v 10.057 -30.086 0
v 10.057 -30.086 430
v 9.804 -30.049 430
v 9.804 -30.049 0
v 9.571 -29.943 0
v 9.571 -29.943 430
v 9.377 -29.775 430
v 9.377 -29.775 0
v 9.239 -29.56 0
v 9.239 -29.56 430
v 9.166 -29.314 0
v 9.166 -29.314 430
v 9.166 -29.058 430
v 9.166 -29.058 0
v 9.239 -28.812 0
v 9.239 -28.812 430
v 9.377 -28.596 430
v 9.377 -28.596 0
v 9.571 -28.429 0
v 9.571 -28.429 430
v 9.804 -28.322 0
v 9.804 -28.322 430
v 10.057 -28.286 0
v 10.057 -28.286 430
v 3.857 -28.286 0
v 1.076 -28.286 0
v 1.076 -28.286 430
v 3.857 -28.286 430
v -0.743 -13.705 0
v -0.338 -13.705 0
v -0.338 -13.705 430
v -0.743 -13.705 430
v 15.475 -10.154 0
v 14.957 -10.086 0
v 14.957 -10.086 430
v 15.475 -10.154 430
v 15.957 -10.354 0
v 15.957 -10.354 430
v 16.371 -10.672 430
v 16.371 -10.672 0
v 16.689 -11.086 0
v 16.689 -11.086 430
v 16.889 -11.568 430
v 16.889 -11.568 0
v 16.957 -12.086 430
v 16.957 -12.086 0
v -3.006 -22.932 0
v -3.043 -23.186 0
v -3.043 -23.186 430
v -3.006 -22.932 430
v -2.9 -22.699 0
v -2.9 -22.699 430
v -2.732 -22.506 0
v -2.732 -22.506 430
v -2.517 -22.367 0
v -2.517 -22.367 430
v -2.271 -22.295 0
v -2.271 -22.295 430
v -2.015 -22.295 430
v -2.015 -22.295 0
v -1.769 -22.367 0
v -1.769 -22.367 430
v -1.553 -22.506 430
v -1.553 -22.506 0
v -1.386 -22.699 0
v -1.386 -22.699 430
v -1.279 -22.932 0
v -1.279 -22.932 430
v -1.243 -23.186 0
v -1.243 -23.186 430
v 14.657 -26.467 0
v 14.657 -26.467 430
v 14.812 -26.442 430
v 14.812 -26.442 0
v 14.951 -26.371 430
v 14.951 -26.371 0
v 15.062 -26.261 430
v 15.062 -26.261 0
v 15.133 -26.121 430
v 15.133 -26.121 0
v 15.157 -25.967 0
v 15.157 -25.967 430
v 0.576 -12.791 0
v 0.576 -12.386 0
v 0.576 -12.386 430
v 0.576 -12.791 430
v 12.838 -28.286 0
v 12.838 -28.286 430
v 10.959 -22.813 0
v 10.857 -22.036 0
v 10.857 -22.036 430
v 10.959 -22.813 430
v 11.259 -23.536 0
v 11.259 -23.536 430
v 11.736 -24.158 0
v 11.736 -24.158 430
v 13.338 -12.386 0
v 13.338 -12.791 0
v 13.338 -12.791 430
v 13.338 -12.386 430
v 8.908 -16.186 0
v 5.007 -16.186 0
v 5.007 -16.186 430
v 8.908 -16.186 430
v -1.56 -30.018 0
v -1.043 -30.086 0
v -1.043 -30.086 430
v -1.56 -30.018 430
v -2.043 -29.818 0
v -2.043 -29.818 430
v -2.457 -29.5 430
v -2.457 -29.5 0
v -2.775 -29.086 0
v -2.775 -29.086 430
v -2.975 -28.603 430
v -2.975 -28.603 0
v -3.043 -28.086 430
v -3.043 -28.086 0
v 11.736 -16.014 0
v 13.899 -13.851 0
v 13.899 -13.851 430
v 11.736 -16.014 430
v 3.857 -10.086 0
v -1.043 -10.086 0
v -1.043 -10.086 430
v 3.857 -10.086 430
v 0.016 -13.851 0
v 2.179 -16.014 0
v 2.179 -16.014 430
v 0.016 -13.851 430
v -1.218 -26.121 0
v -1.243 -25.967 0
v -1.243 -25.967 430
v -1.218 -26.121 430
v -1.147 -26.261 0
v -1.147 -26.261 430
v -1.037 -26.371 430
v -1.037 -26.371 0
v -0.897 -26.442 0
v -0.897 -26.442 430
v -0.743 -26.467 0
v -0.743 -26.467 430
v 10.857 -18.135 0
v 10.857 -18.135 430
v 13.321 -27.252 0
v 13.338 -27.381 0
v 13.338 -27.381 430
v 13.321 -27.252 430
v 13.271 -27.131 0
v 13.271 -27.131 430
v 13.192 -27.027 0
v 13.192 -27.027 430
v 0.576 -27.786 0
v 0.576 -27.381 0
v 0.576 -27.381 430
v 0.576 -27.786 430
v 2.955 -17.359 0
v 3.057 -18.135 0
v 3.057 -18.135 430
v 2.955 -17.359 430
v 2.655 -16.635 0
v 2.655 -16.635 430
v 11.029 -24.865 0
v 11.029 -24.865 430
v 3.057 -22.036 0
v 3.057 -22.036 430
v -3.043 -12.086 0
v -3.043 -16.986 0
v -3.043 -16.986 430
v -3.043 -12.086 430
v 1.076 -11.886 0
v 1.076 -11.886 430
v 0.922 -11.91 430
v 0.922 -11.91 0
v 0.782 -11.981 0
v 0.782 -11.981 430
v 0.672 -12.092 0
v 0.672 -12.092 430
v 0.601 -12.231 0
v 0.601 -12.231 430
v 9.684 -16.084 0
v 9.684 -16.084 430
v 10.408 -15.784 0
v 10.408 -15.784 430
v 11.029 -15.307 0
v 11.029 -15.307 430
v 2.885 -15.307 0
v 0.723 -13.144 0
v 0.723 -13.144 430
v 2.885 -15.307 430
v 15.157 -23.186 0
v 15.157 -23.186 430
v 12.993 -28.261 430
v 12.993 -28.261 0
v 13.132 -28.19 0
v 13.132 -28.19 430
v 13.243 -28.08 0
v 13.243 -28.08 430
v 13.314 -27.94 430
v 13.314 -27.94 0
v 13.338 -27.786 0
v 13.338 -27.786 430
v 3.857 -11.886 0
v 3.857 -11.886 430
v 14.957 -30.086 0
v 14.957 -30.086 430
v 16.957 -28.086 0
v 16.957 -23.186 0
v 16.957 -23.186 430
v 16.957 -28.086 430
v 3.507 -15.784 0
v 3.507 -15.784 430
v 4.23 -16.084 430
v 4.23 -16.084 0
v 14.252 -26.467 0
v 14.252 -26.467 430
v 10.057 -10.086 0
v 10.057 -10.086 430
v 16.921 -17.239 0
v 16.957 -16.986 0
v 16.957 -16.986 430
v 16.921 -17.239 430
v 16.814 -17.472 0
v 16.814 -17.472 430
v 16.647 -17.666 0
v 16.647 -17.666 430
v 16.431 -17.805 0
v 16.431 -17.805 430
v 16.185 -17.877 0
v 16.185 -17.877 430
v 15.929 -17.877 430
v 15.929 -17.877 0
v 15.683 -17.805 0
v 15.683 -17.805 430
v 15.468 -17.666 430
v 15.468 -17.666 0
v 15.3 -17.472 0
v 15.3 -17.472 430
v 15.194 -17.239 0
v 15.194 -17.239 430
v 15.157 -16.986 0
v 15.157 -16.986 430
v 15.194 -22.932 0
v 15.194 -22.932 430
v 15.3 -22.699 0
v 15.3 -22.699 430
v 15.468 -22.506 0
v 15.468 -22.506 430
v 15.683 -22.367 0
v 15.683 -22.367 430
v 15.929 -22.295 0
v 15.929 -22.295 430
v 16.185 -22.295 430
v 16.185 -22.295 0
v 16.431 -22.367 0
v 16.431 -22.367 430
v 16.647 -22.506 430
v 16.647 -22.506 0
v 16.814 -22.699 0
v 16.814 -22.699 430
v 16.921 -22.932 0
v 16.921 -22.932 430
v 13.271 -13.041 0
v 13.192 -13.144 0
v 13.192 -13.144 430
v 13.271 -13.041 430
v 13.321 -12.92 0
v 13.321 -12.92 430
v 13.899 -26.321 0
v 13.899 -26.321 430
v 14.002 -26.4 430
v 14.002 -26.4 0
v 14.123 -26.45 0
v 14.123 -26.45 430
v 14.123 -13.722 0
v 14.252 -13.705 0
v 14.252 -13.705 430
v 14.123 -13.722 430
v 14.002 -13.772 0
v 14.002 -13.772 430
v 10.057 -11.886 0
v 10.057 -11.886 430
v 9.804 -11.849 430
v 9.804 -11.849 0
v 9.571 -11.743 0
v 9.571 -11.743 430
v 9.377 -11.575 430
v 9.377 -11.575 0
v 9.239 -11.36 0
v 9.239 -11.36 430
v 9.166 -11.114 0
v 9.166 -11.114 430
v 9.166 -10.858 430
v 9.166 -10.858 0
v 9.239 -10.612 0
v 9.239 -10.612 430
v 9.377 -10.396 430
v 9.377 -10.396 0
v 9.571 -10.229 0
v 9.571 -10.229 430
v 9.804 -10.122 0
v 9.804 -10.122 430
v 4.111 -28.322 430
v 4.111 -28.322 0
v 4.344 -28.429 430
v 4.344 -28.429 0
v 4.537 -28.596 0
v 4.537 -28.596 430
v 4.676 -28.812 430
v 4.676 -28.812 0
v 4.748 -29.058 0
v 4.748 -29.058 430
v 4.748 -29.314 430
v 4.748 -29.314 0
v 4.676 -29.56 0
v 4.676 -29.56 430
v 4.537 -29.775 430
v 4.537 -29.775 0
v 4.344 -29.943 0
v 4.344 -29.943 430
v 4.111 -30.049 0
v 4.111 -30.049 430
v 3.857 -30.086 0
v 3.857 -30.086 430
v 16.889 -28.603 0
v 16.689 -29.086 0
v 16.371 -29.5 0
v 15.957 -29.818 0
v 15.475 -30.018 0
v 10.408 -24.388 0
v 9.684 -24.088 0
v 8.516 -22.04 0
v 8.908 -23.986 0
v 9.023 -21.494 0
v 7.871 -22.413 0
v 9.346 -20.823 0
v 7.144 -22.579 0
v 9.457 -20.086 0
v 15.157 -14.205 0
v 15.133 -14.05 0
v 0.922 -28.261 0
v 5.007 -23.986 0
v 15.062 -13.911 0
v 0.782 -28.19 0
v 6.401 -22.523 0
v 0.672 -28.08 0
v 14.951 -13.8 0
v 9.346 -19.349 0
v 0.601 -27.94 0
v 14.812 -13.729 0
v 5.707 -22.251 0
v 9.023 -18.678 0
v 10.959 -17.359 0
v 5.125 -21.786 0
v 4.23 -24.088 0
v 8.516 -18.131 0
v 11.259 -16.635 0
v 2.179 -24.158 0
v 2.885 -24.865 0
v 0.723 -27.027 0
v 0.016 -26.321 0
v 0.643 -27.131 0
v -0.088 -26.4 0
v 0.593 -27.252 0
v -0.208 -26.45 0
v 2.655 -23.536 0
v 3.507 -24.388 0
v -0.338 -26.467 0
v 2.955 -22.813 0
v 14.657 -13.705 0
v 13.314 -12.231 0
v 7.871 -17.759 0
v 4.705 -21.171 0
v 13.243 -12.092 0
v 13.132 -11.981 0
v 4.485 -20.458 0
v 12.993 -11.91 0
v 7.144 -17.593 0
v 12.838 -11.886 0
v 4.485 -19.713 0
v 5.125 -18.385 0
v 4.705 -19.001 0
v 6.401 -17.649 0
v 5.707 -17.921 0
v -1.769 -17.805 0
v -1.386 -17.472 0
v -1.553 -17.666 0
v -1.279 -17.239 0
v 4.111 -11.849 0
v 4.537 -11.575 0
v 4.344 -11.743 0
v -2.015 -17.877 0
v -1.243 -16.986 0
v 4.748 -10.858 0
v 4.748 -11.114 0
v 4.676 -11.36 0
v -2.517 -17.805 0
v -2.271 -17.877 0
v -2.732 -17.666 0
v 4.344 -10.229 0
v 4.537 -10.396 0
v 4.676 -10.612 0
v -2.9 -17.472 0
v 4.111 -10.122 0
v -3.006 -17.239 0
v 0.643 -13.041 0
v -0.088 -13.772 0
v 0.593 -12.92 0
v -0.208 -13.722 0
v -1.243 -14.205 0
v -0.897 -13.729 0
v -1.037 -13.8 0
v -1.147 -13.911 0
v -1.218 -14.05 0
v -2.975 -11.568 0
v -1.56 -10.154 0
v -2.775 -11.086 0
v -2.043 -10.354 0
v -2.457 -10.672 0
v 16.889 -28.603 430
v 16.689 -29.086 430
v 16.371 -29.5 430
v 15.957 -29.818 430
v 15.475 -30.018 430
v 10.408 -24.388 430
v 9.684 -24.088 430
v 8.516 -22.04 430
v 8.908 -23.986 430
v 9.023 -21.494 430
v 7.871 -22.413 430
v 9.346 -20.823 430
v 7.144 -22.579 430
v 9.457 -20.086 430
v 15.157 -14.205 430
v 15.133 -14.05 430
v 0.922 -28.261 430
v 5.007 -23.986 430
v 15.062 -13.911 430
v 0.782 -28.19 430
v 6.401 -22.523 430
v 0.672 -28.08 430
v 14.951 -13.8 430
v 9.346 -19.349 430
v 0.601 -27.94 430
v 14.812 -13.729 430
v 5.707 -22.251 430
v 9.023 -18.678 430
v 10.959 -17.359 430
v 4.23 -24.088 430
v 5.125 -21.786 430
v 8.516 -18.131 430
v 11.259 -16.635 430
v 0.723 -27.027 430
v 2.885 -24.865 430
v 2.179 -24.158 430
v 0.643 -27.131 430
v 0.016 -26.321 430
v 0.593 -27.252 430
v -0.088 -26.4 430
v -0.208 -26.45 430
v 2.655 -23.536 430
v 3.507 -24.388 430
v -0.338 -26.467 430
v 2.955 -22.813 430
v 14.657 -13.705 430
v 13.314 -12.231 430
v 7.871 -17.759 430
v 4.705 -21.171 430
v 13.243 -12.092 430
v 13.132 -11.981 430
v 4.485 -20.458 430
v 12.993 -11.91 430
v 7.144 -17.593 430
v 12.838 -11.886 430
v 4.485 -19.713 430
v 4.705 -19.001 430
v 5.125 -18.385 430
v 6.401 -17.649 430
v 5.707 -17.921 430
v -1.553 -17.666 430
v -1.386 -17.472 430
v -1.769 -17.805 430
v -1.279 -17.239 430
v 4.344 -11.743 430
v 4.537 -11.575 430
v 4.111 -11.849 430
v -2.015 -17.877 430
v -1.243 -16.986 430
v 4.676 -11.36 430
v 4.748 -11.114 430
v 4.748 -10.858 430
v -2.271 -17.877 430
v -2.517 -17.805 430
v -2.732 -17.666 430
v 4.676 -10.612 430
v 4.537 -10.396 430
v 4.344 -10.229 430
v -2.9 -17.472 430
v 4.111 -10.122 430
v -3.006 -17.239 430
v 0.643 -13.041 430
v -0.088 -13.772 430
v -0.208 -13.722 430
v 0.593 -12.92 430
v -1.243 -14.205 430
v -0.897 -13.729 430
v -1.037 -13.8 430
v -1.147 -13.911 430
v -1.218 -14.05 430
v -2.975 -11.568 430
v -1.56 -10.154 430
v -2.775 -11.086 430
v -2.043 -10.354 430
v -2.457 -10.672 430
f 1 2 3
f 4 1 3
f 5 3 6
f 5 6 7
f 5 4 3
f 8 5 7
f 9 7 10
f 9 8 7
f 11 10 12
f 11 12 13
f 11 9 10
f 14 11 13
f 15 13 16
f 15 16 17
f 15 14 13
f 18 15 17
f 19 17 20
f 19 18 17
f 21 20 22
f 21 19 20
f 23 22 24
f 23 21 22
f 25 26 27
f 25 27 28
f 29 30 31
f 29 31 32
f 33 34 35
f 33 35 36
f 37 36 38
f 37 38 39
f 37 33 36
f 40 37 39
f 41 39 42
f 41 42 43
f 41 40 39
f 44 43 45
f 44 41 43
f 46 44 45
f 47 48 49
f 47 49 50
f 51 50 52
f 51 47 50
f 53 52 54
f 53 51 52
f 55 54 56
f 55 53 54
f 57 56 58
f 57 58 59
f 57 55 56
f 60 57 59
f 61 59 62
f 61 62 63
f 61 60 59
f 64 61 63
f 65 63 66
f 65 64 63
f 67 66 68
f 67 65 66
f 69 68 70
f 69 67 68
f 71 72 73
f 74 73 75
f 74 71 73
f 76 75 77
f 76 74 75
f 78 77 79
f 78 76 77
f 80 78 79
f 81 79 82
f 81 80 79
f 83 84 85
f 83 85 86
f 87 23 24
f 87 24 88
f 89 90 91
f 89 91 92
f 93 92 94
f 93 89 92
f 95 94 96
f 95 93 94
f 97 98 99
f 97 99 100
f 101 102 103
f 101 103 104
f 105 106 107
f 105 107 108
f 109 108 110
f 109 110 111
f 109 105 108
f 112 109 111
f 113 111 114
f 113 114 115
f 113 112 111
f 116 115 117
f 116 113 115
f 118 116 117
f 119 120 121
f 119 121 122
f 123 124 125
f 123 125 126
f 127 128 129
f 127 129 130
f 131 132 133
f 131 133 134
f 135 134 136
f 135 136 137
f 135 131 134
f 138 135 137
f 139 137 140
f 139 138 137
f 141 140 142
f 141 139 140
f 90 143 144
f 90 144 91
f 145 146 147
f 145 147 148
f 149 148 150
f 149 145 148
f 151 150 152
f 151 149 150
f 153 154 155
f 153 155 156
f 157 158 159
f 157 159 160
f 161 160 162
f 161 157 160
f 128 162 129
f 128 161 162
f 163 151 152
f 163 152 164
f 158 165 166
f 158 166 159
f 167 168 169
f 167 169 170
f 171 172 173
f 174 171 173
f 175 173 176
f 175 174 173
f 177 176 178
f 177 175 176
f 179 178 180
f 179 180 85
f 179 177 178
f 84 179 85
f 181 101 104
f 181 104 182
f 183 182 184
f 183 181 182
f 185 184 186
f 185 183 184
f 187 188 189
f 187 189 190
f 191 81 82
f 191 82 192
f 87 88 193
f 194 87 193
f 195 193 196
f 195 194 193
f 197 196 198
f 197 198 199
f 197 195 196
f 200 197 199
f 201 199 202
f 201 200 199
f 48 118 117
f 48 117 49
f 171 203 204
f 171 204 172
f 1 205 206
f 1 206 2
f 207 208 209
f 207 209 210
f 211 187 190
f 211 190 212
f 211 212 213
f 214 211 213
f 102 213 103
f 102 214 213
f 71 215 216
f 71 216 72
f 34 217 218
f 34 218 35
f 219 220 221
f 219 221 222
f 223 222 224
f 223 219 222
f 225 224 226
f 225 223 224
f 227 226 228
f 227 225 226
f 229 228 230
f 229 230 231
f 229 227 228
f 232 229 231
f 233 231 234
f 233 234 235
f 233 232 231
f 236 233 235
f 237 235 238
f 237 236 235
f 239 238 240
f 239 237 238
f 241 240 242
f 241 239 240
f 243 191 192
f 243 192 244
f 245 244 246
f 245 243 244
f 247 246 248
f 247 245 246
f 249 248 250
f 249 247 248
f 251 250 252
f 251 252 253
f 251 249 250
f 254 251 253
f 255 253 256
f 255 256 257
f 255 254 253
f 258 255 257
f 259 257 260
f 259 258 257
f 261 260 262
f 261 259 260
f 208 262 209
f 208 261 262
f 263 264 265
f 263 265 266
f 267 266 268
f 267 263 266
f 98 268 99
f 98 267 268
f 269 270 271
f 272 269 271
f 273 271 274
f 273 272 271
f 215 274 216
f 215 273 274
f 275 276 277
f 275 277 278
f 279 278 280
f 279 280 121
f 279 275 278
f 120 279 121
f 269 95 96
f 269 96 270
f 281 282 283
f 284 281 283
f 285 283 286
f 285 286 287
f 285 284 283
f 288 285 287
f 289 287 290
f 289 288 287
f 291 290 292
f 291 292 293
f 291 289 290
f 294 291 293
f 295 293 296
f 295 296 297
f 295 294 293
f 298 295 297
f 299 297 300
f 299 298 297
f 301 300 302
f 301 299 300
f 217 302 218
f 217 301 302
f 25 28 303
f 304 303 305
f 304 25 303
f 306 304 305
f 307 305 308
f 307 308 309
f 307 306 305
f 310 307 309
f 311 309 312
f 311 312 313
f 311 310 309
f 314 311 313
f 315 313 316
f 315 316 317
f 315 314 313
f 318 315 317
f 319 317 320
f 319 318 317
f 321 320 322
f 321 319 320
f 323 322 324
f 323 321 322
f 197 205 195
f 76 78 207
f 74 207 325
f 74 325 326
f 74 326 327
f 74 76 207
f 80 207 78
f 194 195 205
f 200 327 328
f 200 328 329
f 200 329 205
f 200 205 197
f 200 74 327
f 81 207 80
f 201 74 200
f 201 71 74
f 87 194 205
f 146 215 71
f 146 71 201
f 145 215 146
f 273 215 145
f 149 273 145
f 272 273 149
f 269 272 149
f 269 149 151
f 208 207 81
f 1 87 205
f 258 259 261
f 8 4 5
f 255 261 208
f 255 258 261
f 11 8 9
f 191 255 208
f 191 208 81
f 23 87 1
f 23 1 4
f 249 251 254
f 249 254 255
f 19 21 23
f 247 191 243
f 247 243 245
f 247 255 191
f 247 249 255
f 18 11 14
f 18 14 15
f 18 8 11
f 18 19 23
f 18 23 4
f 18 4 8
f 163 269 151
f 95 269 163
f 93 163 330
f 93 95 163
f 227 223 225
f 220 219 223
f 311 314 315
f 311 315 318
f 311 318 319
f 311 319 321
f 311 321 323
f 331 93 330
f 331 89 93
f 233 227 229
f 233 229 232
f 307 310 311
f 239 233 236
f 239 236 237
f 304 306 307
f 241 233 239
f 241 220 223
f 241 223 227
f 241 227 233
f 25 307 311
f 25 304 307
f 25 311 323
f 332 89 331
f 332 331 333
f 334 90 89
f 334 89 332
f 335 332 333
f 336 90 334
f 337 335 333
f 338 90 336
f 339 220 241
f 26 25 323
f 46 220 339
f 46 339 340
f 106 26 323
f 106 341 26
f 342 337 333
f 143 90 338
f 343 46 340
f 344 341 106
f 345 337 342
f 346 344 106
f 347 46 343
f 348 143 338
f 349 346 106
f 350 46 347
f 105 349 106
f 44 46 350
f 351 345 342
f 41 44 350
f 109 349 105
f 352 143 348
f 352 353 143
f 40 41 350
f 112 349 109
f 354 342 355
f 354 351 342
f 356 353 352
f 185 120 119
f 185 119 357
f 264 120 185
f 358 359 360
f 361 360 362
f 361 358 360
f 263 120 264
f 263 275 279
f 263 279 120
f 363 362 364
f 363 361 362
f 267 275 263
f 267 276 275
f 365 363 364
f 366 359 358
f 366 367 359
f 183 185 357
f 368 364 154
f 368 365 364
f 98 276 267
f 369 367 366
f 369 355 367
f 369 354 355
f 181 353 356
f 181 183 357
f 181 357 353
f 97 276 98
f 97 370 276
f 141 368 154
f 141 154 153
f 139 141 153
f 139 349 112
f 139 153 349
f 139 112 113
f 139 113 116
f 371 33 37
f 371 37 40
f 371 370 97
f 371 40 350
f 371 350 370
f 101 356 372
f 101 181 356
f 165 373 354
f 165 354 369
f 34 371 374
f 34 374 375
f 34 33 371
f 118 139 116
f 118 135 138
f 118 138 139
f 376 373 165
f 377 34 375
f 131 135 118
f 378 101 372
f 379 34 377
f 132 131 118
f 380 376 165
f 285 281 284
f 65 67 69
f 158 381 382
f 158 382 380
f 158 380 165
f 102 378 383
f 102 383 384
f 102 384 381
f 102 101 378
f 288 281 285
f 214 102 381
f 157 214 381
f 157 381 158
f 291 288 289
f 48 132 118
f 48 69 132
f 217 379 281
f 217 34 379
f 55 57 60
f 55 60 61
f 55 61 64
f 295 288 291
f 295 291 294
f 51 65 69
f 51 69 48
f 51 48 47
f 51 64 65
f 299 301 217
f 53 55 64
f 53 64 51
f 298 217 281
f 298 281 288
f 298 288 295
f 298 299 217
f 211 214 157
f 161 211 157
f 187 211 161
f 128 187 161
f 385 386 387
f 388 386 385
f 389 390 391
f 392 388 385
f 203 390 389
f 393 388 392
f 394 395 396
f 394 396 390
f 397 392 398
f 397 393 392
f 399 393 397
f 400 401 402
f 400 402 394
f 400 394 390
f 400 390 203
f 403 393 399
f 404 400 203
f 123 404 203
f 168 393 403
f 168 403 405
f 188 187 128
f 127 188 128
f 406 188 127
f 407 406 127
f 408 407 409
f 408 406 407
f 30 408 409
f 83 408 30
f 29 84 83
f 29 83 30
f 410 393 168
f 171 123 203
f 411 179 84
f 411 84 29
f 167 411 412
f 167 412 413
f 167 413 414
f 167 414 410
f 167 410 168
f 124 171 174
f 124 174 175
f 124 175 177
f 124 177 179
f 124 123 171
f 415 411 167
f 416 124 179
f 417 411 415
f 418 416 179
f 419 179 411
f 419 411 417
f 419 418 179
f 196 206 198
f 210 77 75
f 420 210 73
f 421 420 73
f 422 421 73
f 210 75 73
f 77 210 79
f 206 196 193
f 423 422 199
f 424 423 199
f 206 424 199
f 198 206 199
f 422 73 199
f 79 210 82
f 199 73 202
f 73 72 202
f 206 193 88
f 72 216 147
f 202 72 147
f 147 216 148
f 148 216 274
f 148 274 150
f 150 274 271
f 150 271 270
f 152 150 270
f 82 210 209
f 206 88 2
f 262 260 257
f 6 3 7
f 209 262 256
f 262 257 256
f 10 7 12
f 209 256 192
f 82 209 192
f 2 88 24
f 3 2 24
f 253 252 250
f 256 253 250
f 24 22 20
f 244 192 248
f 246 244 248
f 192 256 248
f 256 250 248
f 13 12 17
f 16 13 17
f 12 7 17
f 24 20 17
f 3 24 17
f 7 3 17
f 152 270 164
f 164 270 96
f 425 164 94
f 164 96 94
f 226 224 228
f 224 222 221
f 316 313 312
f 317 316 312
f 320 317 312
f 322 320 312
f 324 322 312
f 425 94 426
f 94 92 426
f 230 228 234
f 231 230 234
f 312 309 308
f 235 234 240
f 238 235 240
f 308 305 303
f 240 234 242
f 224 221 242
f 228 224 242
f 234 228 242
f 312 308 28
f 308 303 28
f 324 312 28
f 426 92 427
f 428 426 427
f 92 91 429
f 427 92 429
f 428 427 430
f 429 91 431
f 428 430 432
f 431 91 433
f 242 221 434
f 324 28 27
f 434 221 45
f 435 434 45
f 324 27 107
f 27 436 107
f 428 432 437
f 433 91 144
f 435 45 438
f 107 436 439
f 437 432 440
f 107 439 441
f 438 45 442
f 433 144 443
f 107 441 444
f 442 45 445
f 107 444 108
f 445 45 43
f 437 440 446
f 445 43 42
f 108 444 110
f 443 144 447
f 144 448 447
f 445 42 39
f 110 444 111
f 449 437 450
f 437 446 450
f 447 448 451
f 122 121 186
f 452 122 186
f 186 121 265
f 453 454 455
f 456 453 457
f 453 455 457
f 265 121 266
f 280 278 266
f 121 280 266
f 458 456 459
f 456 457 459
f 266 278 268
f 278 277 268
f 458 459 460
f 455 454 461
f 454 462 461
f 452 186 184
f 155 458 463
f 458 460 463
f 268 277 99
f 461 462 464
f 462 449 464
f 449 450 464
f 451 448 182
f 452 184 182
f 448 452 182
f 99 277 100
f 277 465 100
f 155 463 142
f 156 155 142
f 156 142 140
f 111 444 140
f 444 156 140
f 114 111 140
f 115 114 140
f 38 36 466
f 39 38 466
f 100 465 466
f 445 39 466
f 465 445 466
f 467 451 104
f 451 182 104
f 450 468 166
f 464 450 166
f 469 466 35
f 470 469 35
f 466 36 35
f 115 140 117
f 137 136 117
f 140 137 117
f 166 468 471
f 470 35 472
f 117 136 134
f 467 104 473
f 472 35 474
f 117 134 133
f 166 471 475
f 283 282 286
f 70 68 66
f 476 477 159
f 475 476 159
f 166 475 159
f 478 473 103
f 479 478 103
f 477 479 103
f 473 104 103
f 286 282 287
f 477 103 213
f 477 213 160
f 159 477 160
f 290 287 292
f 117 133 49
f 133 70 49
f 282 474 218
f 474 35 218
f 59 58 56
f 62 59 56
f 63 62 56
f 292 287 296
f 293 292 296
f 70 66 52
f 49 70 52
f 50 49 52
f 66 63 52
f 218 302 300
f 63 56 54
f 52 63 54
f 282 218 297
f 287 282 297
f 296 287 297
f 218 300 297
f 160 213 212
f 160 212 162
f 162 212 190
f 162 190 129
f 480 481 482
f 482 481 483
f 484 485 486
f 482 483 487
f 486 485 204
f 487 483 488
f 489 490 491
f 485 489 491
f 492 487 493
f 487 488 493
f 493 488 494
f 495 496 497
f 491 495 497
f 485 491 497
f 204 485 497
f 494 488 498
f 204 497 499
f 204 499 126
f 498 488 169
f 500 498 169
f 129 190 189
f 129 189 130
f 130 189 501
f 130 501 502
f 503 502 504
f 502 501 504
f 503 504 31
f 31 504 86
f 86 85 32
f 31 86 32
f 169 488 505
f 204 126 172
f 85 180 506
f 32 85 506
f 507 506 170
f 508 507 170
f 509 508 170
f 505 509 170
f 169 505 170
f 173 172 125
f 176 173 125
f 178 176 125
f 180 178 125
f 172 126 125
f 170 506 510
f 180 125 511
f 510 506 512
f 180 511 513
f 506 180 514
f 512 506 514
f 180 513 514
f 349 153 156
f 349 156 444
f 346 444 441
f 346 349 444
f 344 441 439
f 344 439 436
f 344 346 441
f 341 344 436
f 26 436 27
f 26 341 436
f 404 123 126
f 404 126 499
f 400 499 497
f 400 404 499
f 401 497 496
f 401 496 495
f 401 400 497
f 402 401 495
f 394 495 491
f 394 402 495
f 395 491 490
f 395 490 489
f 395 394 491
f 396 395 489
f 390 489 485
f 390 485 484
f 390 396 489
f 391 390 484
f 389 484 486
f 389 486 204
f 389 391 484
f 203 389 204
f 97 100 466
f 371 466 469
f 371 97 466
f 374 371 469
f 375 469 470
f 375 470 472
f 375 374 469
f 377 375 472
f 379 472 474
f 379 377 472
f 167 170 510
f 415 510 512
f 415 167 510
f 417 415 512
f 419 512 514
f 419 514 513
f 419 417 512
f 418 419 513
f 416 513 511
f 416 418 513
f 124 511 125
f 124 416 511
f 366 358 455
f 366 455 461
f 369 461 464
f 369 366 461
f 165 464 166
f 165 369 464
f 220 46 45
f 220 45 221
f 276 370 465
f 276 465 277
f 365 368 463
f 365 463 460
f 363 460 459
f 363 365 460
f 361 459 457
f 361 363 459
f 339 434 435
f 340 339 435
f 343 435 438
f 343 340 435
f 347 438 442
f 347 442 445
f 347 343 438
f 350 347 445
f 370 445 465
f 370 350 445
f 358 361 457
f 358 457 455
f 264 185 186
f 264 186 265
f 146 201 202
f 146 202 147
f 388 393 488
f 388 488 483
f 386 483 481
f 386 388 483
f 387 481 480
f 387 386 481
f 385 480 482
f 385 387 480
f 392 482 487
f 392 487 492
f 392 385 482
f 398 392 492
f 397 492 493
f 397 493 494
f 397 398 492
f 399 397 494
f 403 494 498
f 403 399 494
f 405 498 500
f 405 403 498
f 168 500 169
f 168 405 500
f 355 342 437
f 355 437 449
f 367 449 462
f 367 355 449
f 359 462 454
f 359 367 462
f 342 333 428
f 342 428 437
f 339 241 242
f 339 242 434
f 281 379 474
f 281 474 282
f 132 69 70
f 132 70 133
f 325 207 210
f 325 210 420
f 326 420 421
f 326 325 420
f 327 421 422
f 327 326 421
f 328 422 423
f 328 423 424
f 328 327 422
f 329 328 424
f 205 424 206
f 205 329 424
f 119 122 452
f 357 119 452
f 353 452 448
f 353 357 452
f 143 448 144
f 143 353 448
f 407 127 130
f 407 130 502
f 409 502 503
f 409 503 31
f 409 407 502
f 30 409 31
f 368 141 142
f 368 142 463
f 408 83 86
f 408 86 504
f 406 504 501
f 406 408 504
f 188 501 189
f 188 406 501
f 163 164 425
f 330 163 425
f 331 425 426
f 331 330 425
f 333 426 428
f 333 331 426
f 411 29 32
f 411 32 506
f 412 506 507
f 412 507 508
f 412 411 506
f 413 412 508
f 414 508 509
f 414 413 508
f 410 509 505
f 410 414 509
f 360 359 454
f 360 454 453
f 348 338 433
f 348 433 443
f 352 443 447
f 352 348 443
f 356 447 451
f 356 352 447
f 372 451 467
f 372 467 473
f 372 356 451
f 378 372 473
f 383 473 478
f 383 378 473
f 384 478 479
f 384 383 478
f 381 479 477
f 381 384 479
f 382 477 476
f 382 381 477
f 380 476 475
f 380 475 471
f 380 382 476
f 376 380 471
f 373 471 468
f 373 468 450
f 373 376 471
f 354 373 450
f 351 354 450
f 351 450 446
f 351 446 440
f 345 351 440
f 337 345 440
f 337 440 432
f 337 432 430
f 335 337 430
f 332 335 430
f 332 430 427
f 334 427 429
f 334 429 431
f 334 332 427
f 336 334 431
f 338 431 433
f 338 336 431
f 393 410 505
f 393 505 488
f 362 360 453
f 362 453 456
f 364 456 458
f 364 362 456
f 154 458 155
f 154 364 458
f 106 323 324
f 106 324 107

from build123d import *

# Parameters (mm, degrees)
SKETCH_2_R      = 2.5
EXTRUDE_1_DEPTH = 430


with BuildPart() as part:
    # 草图2 → 凸台-拉伸1 (new body)
    with BuildSketch(Plane.XY):
        with BuildLine():
            Line((-1.042752475, -10.085861632), (3.857247525, -10.085861632))
            ThreePointArc((3.857247525, -10.085861632), (4.757247525, -10.985861632), (3.857247525, -11.885861632))
            Line((3.857247525, -11.885861632), (1.076161722, -11.885861632))
            ThreePointArc((1.076161722, -11.885861632), (0.722608332, -12.032308241), (0.576161722, -12.385861632))
            Line((0.576161722, -12.385861632), (0.576161722, -12.790788968))
            ThreePointArc((0.576161722, -12.790788968), (0.614221956, -12.982130685), (0.722608332, -13.144342359))
            Line((0.722608332, -13.144342359), (2.885447948, -15.307181975))
            ThreePointArc((2.885447948, -15.307181975), (3.858717994, -15.957500229), (5.006768291, -16.185861632))
            Line((5.006768291, -16.185861632), (8.907726758, -16.185861632))
            ThreePointArc((8.907726758, -16.185861632), (10.055777055, -15.957500229), (11.029047102, -15.307181975))
            Line((11.029047102, -15.307181975), (13.191886718, -13.144342359))
            ThreePointArc((13.191886718, -13.144342359), (13.300273094, -12.982130685), (13.338333327, -12.790788968))
            Line((13.338333327, -12.790788968), (13.338333327, -12.385861632))
            ThreePointArc((13.338333327, -12.385861632), (13.191886718, -12.032308241), (12.838333327, -11.885861632))
            Line((12.838333327, -11.885861632), (10.057247525, -11.885861632))
            ThreePointArc((10.057247525, -11.885861632), (9.157247525, -10.985861632), (10.057247525, -10.085861632))
            Line((10.057247525, -10.085861632), (14.957247525, -10.085861632))
            ThreePointArc((14.957247525, -10.085861632), (16.371461087, -10.671648069), (16.957247525, -12.085861632))
            Line((16.957247525, -12.085861632), (16.957247525, -16.985861632))
            ThreePointArc((16.957247525, -16.985861632), (16.057247525, -17.885861632), (15.157247525, -16.985861632))
            Line((15.157247525, -16.985861632), (15.157247525, -14.204775829))
            ThreePointArc((15.157247525, -14.204775829), (15.010800915, -13.851222438), (14.657247525, -13.704775829))
            Line((14.657247525, -13.704775829), (14.252320188, -13.704775829))
            ThreePointArc((14.252320188, -13.704775829), (14.060978472, -13.742836063), (13.898766797, -13.851222438))
            Line((13.898766797, -13.851222438), (11.735927181, -16.014062054))
            ThreePointArc((11.735927181, -16.014062054), (11.085608927, -16.987332101), (10.857247525, -18.135382398))
            Line((10.857247525, -18.135382398), (10.857247525, -22.036340865))
            ThreePointArc((10.857247525, -22.036340865), (11.085608927, -23.184391162), (11.735927181, -24.157661209))
            Line((11.735927181, -24.157661209), (13.898766797, -26.320500825))
            ThreePointArc((13.898766797, -26.320500825), (14.060978472, -26.4288872), (14.252320188, -26.466947434))
            Line((14.252320188, -26.466947434), (14.657247525, -26.466947434))
            ThreePointArc((14.657247525, -26.466947434), (15.010800915, -26.320500825), (15.157247525, -25.966947434))
            Line((15.157247525, -25.966947434), (15.157247525, -23.185861632))
            ThreePointArc((15.157247525, -23.185861632), (16.057247525, -22.285861632), (16.957247525, -23.185861632))
            Line((16.957247525, -23.185861632), (16.957247525, -28.085861632))
            ThreePointArc((16.957247525, -28.085861632), (16.371461087, -29.500075194), (14.957247525, -30.085861632))
            Line((14.957247525, -30.085861632), (10.057247525, -30.085861632))
            ThreePointArc((10.057247525, -30.085861632), (9.157247525, -29.185861632), (10.057247525, -28.285861632))
            Line((10.057247525, -28.285861632), (12.838333327, -28.285861632))
            ThreePointArc((12.838333327, -28.285861632), (13.191886718, -28.139415022), (13.338333327, -27.785861632))
            Line((13.338333327, -27.785861632), (13.338333327, -27.380934295))
            ThreePointArc((13.338333327, -27.380934295), (13.300273094, -27.189592579), (13.191886718, -27.027380904))
            Line((13.191886718, -27.027380904), (11.029047102, -24.864541288))
            ThreePointArc((11.029047102, -24.864541288), (10.055777055, -24.214223034), (8.907726758, -23.985861632))
            Line((8.907726758, -23.985861632), (5.006768291, -23.985861632))
            ThreePointArc((5.006768291, -23.985861632), (3.858717994, -24.214223034), (2.885447948, -24.864541288))
            Line((2.885447948, -24.864541288), (0.722608332, -27.027380904))
            ThreePointArc((0.722608332, -27.027380904), (0.614221956, -27.189592579), (0.576161722, -27.380934295))
            Line((0.576161722, -27.380934295), (0.576161722, -27.785861632))
            ThreePointArc((0.576161722, -27.785861632), (0.722608332, -28.139415022), (1.076161722, -28.285861632))
            Line((1.076161722, -28.285861632), (3.857247525, -28.285861632))
            ThreePointArc((3.857247525, -28.285861632), (4.757247525, -29.185861632), (3.857247525, -30.085861632))
            Line((3.857247525, -30.085861632), (-1.042752475, -30.085861632))
            ThreePointArc((-1.042752475, -30.085861632), (-2.456966038, -29.500075194), (-3.042752475, -28.085861632))
            Line((-3.042752475, -28.085861632), (-3.042752475, -23.185861632))
            ThreePointArc((-3.042752475, -23.185861632), (-2.142752475, -22.285861632), (-1.242752475, -23.185861632))
            Line((-1.242752475, -23.185861632), (-1.242752475, -25.966947434))
            ThreePointArc((-1.242752475, -25.966947434), (-1.096305866, -26.320500825), (-0.742752475, -26.466947434))
            Line((-0.742752475, -26.466947434), (-0.337825138, -26.466947434))
            ThreePointArc((-0.337825138, -26.466947434), (-0.146483422, -26.4288872), (0.015728252, -26.320500825))
            Line((0.015728252, -26.320500825), (2.178567868, -24.157661209))
            ThreePointArc((2.178567868, -24.157661209), (2.828886122, -23.184391162), (3.057247525, -22.036340865))
            Line((3.057247525, -22.036340865), (3.057247525, -18.135382398))
            ThreePointArc((3.057247525, -18.135382398), (2.828886122, -16.987332101), (2.178567868, -16.014062054))
            Line((2.178567868, -16.014062054), (0.015728252, -13.851222438))
            ThreePointArc((0.015728252, -13.851222438), (-0.146483422, -13.742836063), (-0.337825138, -13.704775829))
            Line((-0.337825138, -13.704775829), (-0.742752475, -13.704775829))
            ThreePointArc((-0.742752475, -13.704775829), (-1.096305866, -13.851222438), (-1.242752475, -14.204775829))
            Line((-1.242752475, -14.204775829), (-1.242752475, -16.985861632))
            ThreePointArc((-1.242752475, -16.985861632), (-2.142752475, -17.885861632), (-3.042752475, -16.985861632))
            Line((-3.042752475, -16.985861632), (-3.042752475, -12.085861632))
            ThreePointArc((-3.042752475, -12.085861632), (-2.456966038, -10.671648069), (-1.042752475, -10.085861632))
        make_face()
        with Locations((6.957247525, -20.085861632)):
            Circle(SKETCH_2_R, mode=Mode.SUBTRACT)
    extrude(amount=EXTRUDE_1_DEPTH)


solid = part.part
